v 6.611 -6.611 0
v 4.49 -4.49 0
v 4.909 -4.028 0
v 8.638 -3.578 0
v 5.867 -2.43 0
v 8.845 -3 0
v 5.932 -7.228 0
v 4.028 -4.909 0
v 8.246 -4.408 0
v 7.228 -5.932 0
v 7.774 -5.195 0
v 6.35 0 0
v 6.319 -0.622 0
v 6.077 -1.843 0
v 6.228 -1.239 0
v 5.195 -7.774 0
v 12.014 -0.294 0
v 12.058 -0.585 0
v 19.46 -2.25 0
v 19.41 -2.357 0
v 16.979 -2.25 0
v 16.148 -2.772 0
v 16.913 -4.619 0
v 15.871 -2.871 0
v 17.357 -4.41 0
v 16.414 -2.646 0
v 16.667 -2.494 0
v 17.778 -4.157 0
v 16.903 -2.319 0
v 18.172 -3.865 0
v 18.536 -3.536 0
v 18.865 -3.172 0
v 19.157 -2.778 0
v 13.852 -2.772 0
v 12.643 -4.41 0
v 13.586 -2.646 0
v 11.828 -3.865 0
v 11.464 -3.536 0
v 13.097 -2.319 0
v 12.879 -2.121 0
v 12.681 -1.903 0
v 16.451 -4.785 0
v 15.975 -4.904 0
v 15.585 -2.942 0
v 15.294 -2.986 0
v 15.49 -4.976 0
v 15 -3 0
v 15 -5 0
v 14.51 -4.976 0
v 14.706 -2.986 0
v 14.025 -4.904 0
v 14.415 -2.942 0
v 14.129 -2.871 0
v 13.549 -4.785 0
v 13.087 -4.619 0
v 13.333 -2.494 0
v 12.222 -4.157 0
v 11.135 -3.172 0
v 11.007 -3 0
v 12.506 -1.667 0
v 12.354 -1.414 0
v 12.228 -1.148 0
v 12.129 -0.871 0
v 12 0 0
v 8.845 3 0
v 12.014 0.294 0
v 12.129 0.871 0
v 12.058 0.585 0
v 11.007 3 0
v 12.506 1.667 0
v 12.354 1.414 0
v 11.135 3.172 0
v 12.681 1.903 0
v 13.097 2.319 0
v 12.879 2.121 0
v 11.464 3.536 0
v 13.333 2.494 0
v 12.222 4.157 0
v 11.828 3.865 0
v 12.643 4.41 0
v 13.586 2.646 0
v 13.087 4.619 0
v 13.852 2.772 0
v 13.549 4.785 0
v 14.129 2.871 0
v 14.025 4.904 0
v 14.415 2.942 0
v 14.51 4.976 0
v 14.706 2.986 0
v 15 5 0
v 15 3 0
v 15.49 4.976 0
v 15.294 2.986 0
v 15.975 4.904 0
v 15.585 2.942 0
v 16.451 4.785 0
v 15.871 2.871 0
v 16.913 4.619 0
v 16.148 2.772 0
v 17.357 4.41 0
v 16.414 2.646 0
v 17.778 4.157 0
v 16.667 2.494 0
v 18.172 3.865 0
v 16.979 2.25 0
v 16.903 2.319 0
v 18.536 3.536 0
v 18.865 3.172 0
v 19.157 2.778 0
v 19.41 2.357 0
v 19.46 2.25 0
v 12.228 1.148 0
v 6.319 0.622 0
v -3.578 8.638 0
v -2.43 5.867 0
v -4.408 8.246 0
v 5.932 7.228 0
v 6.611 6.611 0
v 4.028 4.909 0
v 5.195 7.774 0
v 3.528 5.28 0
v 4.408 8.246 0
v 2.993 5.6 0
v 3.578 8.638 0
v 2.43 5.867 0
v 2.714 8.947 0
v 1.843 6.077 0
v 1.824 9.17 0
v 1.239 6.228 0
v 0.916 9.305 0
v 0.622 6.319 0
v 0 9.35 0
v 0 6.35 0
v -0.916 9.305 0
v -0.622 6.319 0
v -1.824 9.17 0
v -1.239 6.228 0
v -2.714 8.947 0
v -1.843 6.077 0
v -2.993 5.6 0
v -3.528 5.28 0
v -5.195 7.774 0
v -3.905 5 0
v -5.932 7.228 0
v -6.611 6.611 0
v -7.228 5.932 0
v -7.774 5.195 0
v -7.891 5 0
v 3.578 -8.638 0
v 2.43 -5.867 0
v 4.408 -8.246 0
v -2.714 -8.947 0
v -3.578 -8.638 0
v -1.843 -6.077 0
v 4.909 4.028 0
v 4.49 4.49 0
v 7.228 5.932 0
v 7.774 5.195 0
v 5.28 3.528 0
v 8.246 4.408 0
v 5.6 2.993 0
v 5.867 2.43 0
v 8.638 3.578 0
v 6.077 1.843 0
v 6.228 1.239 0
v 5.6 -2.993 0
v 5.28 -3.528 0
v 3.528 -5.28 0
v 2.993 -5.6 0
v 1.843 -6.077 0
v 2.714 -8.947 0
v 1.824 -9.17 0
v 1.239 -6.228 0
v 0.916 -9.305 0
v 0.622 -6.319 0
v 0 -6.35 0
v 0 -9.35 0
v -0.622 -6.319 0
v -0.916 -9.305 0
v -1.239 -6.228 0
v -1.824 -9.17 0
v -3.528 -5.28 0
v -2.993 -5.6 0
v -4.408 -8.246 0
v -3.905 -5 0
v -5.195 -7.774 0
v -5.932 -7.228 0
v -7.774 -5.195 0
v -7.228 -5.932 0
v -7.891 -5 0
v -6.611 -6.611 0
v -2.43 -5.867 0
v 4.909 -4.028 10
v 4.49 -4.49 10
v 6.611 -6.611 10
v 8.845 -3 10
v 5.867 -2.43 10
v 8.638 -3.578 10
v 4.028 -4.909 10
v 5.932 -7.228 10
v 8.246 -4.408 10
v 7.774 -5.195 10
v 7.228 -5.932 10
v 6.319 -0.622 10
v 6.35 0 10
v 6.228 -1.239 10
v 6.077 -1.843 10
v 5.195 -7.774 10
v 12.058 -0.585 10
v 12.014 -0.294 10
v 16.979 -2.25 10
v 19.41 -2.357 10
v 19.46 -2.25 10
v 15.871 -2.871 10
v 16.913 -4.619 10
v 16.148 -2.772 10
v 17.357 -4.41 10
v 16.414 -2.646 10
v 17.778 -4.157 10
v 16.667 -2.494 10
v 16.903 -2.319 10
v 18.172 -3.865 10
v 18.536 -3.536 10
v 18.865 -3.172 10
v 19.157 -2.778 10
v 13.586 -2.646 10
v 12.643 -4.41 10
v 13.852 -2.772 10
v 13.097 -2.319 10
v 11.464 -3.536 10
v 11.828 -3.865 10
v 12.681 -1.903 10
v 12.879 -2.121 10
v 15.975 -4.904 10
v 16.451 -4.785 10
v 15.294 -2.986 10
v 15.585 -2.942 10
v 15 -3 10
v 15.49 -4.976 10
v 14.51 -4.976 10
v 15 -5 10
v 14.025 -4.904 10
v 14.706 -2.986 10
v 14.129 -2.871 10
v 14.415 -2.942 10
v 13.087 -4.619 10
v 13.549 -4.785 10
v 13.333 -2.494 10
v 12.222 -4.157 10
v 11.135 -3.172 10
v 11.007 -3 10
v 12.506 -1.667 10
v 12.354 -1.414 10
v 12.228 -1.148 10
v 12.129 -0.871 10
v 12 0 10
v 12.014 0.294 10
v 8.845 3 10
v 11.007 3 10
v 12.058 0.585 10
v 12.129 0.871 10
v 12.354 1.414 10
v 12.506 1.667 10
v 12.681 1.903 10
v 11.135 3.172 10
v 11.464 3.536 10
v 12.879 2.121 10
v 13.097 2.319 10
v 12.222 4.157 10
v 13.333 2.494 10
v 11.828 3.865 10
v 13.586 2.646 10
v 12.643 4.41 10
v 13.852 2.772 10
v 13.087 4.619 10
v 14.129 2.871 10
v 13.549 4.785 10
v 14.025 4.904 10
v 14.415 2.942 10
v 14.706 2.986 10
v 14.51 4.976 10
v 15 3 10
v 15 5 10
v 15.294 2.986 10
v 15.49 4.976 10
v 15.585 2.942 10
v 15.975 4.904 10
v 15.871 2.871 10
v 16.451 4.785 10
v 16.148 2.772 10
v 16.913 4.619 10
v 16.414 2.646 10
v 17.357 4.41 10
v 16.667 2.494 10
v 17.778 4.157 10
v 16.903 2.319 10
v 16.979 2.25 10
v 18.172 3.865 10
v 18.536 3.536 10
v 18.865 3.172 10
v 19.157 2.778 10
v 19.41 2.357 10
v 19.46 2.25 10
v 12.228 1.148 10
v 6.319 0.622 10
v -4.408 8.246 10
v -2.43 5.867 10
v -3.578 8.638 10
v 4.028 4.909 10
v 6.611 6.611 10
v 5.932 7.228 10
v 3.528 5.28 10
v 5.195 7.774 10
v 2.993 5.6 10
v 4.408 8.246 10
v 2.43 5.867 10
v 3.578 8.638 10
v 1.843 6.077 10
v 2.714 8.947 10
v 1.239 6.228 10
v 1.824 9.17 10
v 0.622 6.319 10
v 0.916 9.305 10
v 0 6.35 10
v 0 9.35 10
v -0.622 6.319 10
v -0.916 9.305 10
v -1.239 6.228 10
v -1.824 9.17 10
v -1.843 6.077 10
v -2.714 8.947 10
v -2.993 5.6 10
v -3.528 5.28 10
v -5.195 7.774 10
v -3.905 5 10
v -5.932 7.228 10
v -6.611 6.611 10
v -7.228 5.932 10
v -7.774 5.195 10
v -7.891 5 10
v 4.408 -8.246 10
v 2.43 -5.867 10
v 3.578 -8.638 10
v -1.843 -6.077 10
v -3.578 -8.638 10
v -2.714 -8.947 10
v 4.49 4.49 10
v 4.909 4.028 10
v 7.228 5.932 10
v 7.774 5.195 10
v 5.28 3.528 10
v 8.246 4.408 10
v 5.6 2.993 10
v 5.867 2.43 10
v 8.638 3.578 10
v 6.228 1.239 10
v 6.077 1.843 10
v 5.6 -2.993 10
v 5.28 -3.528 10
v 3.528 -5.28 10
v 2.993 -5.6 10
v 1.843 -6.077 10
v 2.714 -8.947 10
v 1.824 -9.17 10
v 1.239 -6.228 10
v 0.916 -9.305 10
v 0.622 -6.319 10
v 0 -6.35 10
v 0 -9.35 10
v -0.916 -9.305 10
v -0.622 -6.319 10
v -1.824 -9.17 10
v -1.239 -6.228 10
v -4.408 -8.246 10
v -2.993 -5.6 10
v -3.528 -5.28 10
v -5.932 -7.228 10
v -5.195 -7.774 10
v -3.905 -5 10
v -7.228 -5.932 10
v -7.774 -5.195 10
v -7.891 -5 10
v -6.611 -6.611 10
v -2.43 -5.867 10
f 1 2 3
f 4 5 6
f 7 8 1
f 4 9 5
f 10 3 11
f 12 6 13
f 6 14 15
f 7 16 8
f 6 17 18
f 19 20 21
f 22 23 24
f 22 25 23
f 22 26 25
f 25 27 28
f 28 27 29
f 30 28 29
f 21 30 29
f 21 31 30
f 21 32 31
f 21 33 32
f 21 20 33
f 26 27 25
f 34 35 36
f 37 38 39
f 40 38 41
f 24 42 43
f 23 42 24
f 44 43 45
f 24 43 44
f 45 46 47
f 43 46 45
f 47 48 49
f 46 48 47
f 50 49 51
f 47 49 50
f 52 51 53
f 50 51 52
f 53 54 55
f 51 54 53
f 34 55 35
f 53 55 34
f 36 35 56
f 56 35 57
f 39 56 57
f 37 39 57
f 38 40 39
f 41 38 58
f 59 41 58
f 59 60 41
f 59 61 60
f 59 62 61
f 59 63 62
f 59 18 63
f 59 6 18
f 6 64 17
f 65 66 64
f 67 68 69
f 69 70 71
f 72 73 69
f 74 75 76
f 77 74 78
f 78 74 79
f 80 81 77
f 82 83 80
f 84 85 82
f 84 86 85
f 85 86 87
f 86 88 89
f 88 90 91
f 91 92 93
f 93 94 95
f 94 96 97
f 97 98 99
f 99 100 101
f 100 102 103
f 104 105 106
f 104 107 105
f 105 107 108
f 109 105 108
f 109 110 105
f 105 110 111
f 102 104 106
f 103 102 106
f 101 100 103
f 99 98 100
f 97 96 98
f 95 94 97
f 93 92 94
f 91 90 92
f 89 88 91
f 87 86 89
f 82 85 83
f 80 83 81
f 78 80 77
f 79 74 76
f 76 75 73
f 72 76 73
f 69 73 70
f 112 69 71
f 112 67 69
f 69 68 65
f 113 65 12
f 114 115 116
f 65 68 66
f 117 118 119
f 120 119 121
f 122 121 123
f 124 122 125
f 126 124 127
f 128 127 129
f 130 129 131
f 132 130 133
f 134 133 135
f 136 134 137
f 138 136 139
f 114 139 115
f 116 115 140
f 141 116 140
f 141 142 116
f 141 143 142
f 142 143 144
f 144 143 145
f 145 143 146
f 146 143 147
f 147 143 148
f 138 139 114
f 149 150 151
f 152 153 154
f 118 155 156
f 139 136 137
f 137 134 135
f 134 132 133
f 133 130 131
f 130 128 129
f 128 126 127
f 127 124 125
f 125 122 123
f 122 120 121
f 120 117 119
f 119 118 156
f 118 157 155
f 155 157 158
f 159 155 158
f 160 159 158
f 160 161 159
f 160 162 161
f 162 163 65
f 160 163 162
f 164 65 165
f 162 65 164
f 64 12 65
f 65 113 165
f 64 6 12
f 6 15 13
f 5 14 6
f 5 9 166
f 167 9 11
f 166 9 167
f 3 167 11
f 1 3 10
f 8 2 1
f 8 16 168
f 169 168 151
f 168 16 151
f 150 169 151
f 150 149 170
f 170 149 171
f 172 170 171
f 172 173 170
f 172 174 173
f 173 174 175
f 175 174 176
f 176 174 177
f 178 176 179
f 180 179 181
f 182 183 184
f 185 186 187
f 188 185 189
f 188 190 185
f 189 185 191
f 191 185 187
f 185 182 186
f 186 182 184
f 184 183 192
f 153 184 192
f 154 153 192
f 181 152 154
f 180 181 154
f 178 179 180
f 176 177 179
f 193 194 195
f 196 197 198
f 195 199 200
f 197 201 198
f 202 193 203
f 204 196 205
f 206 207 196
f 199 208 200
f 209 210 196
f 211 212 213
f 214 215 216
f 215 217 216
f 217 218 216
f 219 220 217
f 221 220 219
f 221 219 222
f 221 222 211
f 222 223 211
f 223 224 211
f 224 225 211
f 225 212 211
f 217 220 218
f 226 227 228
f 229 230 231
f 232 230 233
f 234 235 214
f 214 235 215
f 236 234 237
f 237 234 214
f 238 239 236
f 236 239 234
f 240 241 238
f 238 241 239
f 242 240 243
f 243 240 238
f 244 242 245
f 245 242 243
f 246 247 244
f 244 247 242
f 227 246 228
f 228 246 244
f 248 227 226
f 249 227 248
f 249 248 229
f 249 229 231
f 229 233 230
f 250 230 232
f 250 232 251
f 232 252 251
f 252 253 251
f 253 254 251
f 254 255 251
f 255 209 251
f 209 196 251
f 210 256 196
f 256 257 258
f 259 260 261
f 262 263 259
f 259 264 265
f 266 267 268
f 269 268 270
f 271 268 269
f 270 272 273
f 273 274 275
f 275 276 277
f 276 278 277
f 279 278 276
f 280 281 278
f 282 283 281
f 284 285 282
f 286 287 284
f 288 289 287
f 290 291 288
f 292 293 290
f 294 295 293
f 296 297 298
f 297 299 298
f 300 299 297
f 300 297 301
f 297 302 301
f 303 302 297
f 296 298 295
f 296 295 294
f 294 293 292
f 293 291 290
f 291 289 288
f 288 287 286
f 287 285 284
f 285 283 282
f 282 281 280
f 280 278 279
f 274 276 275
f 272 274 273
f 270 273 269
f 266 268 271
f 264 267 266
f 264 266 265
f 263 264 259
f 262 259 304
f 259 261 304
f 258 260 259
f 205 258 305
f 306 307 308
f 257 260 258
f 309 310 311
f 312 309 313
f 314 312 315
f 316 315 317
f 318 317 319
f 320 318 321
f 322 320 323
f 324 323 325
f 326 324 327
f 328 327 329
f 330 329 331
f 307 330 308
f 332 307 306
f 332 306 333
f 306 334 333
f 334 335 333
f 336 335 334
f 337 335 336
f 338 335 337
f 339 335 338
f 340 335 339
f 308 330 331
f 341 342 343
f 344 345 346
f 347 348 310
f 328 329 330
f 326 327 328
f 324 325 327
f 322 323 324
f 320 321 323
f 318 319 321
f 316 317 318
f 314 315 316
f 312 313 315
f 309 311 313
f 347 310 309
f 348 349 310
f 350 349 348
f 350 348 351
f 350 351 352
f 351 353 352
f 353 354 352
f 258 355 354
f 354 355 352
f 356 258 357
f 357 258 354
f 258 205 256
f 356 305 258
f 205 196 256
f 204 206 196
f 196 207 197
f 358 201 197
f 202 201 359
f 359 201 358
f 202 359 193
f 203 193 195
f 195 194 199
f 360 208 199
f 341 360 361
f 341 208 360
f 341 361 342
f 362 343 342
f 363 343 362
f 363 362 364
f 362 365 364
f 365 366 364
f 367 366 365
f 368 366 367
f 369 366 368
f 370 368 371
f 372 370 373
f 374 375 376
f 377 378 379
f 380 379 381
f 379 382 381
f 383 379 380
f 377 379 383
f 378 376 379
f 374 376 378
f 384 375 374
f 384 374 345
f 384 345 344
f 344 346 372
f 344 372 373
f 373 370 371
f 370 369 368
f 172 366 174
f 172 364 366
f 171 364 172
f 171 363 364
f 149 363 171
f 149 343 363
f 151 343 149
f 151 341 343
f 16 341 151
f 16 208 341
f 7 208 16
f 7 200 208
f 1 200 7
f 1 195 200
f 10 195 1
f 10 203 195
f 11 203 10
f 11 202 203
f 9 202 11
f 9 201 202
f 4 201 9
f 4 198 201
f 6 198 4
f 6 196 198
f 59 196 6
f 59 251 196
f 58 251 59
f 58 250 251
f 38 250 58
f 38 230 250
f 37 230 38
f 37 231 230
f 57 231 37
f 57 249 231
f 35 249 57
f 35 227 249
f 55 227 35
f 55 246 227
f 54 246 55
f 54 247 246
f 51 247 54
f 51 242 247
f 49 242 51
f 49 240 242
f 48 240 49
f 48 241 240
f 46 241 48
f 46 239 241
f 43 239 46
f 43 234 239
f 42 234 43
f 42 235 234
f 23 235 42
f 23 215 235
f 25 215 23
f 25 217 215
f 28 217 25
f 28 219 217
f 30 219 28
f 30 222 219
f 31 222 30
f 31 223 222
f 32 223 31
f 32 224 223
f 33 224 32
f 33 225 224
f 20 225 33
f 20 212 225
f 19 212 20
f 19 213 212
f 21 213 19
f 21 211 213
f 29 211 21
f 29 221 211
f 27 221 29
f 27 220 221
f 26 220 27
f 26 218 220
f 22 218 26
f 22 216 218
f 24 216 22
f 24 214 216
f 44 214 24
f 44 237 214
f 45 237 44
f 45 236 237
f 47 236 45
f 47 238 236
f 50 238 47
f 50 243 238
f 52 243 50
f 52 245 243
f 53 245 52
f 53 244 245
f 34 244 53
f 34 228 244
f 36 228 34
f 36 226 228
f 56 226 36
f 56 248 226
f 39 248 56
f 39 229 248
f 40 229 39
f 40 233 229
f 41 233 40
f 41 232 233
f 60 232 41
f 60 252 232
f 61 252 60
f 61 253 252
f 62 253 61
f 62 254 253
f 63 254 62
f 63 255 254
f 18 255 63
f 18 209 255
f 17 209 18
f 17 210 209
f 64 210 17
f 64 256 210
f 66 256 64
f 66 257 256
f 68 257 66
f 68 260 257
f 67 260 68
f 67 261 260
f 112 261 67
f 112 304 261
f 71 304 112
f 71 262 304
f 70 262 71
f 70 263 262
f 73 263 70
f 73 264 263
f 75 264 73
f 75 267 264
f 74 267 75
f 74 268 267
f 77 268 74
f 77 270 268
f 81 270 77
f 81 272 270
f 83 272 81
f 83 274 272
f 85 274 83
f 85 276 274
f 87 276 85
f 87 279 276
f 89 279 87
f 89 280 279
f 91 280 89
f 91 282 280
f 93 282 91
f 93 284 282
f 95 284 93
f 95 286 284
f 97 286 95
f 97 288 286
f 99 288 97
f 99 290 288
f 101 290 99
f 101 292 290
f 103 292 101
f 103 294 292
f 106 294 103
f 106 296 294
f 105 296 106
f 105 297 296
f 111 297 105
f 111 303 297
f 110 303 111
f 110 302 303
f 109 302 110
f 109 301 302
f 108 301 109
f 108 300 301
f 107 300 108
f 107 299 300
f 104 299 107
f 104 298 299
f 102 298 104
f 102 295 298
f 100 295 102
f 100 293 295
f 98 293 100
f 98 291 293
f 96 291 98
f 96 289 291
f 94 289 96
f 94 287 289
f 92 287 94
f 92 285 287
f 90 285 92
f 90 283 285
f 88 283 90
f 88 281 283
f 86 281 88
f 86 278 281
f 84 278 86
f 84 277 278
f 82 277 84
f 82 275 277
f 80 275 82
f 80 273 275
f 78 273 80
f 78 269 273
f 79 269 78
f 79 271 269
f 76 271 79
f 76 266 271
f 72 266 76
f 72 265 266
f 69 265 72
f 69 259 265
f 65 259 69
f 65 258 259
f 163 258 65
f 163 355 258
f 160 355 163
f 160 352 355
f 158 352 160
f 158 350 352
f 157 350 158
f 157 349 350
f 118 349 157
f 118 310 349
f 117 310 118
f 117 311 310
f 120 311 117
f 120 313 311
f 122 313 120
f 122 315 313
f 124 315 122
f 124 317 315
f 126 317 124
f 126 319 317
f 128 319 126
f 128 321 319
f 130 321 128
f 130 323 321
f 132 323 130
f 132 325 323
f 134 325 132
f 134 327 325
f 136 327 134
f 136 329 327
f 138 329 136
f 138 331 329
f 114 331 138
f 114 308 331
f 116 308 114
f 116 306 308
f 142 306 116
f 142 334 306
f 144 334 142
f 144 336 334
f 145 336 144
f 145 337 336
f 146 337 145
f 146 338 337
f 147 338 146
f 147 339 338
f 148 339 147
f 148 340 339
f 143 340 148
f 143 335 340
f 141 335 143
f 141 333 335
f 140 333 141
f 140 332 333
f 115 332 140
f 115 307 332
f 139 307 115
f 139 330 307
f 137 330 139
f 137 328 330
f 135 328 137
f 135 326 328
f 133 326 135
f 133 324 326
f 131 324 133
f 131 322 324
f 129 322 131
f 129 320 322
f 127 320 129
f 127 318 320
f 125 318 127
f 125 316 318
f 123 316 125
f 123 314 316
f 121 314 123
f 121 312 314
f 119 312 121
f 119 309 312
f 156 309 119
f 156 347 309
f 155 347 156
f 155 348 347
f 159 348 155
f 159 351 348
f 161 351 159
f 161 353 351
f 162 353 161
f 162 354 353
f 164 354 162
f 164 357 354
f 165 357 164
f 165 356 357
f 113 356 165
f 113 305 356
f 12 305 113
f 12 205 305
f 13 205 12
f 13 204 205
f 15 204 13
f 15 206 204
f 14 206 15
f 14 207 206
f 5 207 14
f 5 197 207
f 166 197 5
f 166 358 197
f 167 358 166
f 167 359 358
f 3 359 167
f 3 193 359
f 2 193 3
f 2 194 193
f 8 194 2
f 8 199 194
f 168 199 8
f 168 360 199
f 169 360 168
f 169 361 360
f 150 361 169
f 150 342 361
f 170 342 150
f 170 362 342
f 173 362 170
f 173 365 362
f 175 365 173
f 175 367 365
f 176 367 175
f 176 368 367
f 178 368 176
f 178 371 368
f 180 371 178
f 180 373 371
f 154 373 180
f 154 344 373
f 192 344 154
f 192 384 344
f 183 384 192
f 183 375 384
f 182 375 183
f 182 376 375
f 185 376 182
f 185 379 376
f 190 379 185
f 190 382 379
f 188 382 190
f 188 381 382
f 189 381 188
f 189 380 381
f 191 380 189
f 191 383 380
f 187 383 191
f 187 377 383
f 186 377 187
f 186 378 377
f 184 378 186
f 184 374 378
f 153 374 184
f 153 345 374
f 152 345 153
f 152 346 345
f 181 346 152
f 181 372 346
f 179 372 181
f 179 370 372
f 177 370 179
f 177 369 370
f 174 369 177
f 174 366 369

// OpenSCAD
$fn = 64;

// Rod ring parameters
rod_inner_r = 6.35;      // Inner radius (diameter 12.7)
rod_outer_r = 9.35;      // Outer radius (diameter 18.7)

// Tube ring parameters
tube_center_x = 15;      // Center X position
tube_inner_r = 3;        // Inner radius (diameter 6)
tube_outer_r = 5;        // Outer radius (diameter 10)

// Bridge parameters
bridge_x_start = 8;      // Bridge start X
bridge_x_end = 12;       // Bridge end X
bridge_width_y = 6;      // Bridge width in Y direction

// Extrusion height
extrusion_h = 10;        // Z height (10 mm tall extrusion)

// Create the 2D profile
module profile_2d() {
    difference() {
        union() {
            // Rod ring (complete annulus)
            difference() {
                circle(r = rod_outer_r);
                circle(r = rod_inner_r);
            }
            
            // Tube ring (complete annulus, centered at x=15)
            translate([tube_center_x, 0]) {
                difference() {
                    circle(r = tube_outer_r);
                    circle(r = tube_inner_r);
                }
            }
            
            // Solid bridge connecting the rings
            translate([(bridge_x_start + bridge_x_end) / 2, 0]) {
                square([bridge_x_end - bridge_x_start, bridge_width_y], center = true);
            }
        }
        
        // Opening cut for rod ring: x < 0 and -5 < y < 5
        translate([-rod_outer_r - 1, -5]) {
            square([rod_outer_r + 1, 10]);
        }
        
        // Opening cut for tube ring: x > 15 and -2.25 < y < 2.25
        translate([tube_center_x, -2.25]) {
            square([tube_outer_r + 1, 4.5]);
        }
    }
}

// Extrude the 2D profile 10 mm in Z direction
linear_extrude(height = extrusion_h) {
    profile_2d();
}
